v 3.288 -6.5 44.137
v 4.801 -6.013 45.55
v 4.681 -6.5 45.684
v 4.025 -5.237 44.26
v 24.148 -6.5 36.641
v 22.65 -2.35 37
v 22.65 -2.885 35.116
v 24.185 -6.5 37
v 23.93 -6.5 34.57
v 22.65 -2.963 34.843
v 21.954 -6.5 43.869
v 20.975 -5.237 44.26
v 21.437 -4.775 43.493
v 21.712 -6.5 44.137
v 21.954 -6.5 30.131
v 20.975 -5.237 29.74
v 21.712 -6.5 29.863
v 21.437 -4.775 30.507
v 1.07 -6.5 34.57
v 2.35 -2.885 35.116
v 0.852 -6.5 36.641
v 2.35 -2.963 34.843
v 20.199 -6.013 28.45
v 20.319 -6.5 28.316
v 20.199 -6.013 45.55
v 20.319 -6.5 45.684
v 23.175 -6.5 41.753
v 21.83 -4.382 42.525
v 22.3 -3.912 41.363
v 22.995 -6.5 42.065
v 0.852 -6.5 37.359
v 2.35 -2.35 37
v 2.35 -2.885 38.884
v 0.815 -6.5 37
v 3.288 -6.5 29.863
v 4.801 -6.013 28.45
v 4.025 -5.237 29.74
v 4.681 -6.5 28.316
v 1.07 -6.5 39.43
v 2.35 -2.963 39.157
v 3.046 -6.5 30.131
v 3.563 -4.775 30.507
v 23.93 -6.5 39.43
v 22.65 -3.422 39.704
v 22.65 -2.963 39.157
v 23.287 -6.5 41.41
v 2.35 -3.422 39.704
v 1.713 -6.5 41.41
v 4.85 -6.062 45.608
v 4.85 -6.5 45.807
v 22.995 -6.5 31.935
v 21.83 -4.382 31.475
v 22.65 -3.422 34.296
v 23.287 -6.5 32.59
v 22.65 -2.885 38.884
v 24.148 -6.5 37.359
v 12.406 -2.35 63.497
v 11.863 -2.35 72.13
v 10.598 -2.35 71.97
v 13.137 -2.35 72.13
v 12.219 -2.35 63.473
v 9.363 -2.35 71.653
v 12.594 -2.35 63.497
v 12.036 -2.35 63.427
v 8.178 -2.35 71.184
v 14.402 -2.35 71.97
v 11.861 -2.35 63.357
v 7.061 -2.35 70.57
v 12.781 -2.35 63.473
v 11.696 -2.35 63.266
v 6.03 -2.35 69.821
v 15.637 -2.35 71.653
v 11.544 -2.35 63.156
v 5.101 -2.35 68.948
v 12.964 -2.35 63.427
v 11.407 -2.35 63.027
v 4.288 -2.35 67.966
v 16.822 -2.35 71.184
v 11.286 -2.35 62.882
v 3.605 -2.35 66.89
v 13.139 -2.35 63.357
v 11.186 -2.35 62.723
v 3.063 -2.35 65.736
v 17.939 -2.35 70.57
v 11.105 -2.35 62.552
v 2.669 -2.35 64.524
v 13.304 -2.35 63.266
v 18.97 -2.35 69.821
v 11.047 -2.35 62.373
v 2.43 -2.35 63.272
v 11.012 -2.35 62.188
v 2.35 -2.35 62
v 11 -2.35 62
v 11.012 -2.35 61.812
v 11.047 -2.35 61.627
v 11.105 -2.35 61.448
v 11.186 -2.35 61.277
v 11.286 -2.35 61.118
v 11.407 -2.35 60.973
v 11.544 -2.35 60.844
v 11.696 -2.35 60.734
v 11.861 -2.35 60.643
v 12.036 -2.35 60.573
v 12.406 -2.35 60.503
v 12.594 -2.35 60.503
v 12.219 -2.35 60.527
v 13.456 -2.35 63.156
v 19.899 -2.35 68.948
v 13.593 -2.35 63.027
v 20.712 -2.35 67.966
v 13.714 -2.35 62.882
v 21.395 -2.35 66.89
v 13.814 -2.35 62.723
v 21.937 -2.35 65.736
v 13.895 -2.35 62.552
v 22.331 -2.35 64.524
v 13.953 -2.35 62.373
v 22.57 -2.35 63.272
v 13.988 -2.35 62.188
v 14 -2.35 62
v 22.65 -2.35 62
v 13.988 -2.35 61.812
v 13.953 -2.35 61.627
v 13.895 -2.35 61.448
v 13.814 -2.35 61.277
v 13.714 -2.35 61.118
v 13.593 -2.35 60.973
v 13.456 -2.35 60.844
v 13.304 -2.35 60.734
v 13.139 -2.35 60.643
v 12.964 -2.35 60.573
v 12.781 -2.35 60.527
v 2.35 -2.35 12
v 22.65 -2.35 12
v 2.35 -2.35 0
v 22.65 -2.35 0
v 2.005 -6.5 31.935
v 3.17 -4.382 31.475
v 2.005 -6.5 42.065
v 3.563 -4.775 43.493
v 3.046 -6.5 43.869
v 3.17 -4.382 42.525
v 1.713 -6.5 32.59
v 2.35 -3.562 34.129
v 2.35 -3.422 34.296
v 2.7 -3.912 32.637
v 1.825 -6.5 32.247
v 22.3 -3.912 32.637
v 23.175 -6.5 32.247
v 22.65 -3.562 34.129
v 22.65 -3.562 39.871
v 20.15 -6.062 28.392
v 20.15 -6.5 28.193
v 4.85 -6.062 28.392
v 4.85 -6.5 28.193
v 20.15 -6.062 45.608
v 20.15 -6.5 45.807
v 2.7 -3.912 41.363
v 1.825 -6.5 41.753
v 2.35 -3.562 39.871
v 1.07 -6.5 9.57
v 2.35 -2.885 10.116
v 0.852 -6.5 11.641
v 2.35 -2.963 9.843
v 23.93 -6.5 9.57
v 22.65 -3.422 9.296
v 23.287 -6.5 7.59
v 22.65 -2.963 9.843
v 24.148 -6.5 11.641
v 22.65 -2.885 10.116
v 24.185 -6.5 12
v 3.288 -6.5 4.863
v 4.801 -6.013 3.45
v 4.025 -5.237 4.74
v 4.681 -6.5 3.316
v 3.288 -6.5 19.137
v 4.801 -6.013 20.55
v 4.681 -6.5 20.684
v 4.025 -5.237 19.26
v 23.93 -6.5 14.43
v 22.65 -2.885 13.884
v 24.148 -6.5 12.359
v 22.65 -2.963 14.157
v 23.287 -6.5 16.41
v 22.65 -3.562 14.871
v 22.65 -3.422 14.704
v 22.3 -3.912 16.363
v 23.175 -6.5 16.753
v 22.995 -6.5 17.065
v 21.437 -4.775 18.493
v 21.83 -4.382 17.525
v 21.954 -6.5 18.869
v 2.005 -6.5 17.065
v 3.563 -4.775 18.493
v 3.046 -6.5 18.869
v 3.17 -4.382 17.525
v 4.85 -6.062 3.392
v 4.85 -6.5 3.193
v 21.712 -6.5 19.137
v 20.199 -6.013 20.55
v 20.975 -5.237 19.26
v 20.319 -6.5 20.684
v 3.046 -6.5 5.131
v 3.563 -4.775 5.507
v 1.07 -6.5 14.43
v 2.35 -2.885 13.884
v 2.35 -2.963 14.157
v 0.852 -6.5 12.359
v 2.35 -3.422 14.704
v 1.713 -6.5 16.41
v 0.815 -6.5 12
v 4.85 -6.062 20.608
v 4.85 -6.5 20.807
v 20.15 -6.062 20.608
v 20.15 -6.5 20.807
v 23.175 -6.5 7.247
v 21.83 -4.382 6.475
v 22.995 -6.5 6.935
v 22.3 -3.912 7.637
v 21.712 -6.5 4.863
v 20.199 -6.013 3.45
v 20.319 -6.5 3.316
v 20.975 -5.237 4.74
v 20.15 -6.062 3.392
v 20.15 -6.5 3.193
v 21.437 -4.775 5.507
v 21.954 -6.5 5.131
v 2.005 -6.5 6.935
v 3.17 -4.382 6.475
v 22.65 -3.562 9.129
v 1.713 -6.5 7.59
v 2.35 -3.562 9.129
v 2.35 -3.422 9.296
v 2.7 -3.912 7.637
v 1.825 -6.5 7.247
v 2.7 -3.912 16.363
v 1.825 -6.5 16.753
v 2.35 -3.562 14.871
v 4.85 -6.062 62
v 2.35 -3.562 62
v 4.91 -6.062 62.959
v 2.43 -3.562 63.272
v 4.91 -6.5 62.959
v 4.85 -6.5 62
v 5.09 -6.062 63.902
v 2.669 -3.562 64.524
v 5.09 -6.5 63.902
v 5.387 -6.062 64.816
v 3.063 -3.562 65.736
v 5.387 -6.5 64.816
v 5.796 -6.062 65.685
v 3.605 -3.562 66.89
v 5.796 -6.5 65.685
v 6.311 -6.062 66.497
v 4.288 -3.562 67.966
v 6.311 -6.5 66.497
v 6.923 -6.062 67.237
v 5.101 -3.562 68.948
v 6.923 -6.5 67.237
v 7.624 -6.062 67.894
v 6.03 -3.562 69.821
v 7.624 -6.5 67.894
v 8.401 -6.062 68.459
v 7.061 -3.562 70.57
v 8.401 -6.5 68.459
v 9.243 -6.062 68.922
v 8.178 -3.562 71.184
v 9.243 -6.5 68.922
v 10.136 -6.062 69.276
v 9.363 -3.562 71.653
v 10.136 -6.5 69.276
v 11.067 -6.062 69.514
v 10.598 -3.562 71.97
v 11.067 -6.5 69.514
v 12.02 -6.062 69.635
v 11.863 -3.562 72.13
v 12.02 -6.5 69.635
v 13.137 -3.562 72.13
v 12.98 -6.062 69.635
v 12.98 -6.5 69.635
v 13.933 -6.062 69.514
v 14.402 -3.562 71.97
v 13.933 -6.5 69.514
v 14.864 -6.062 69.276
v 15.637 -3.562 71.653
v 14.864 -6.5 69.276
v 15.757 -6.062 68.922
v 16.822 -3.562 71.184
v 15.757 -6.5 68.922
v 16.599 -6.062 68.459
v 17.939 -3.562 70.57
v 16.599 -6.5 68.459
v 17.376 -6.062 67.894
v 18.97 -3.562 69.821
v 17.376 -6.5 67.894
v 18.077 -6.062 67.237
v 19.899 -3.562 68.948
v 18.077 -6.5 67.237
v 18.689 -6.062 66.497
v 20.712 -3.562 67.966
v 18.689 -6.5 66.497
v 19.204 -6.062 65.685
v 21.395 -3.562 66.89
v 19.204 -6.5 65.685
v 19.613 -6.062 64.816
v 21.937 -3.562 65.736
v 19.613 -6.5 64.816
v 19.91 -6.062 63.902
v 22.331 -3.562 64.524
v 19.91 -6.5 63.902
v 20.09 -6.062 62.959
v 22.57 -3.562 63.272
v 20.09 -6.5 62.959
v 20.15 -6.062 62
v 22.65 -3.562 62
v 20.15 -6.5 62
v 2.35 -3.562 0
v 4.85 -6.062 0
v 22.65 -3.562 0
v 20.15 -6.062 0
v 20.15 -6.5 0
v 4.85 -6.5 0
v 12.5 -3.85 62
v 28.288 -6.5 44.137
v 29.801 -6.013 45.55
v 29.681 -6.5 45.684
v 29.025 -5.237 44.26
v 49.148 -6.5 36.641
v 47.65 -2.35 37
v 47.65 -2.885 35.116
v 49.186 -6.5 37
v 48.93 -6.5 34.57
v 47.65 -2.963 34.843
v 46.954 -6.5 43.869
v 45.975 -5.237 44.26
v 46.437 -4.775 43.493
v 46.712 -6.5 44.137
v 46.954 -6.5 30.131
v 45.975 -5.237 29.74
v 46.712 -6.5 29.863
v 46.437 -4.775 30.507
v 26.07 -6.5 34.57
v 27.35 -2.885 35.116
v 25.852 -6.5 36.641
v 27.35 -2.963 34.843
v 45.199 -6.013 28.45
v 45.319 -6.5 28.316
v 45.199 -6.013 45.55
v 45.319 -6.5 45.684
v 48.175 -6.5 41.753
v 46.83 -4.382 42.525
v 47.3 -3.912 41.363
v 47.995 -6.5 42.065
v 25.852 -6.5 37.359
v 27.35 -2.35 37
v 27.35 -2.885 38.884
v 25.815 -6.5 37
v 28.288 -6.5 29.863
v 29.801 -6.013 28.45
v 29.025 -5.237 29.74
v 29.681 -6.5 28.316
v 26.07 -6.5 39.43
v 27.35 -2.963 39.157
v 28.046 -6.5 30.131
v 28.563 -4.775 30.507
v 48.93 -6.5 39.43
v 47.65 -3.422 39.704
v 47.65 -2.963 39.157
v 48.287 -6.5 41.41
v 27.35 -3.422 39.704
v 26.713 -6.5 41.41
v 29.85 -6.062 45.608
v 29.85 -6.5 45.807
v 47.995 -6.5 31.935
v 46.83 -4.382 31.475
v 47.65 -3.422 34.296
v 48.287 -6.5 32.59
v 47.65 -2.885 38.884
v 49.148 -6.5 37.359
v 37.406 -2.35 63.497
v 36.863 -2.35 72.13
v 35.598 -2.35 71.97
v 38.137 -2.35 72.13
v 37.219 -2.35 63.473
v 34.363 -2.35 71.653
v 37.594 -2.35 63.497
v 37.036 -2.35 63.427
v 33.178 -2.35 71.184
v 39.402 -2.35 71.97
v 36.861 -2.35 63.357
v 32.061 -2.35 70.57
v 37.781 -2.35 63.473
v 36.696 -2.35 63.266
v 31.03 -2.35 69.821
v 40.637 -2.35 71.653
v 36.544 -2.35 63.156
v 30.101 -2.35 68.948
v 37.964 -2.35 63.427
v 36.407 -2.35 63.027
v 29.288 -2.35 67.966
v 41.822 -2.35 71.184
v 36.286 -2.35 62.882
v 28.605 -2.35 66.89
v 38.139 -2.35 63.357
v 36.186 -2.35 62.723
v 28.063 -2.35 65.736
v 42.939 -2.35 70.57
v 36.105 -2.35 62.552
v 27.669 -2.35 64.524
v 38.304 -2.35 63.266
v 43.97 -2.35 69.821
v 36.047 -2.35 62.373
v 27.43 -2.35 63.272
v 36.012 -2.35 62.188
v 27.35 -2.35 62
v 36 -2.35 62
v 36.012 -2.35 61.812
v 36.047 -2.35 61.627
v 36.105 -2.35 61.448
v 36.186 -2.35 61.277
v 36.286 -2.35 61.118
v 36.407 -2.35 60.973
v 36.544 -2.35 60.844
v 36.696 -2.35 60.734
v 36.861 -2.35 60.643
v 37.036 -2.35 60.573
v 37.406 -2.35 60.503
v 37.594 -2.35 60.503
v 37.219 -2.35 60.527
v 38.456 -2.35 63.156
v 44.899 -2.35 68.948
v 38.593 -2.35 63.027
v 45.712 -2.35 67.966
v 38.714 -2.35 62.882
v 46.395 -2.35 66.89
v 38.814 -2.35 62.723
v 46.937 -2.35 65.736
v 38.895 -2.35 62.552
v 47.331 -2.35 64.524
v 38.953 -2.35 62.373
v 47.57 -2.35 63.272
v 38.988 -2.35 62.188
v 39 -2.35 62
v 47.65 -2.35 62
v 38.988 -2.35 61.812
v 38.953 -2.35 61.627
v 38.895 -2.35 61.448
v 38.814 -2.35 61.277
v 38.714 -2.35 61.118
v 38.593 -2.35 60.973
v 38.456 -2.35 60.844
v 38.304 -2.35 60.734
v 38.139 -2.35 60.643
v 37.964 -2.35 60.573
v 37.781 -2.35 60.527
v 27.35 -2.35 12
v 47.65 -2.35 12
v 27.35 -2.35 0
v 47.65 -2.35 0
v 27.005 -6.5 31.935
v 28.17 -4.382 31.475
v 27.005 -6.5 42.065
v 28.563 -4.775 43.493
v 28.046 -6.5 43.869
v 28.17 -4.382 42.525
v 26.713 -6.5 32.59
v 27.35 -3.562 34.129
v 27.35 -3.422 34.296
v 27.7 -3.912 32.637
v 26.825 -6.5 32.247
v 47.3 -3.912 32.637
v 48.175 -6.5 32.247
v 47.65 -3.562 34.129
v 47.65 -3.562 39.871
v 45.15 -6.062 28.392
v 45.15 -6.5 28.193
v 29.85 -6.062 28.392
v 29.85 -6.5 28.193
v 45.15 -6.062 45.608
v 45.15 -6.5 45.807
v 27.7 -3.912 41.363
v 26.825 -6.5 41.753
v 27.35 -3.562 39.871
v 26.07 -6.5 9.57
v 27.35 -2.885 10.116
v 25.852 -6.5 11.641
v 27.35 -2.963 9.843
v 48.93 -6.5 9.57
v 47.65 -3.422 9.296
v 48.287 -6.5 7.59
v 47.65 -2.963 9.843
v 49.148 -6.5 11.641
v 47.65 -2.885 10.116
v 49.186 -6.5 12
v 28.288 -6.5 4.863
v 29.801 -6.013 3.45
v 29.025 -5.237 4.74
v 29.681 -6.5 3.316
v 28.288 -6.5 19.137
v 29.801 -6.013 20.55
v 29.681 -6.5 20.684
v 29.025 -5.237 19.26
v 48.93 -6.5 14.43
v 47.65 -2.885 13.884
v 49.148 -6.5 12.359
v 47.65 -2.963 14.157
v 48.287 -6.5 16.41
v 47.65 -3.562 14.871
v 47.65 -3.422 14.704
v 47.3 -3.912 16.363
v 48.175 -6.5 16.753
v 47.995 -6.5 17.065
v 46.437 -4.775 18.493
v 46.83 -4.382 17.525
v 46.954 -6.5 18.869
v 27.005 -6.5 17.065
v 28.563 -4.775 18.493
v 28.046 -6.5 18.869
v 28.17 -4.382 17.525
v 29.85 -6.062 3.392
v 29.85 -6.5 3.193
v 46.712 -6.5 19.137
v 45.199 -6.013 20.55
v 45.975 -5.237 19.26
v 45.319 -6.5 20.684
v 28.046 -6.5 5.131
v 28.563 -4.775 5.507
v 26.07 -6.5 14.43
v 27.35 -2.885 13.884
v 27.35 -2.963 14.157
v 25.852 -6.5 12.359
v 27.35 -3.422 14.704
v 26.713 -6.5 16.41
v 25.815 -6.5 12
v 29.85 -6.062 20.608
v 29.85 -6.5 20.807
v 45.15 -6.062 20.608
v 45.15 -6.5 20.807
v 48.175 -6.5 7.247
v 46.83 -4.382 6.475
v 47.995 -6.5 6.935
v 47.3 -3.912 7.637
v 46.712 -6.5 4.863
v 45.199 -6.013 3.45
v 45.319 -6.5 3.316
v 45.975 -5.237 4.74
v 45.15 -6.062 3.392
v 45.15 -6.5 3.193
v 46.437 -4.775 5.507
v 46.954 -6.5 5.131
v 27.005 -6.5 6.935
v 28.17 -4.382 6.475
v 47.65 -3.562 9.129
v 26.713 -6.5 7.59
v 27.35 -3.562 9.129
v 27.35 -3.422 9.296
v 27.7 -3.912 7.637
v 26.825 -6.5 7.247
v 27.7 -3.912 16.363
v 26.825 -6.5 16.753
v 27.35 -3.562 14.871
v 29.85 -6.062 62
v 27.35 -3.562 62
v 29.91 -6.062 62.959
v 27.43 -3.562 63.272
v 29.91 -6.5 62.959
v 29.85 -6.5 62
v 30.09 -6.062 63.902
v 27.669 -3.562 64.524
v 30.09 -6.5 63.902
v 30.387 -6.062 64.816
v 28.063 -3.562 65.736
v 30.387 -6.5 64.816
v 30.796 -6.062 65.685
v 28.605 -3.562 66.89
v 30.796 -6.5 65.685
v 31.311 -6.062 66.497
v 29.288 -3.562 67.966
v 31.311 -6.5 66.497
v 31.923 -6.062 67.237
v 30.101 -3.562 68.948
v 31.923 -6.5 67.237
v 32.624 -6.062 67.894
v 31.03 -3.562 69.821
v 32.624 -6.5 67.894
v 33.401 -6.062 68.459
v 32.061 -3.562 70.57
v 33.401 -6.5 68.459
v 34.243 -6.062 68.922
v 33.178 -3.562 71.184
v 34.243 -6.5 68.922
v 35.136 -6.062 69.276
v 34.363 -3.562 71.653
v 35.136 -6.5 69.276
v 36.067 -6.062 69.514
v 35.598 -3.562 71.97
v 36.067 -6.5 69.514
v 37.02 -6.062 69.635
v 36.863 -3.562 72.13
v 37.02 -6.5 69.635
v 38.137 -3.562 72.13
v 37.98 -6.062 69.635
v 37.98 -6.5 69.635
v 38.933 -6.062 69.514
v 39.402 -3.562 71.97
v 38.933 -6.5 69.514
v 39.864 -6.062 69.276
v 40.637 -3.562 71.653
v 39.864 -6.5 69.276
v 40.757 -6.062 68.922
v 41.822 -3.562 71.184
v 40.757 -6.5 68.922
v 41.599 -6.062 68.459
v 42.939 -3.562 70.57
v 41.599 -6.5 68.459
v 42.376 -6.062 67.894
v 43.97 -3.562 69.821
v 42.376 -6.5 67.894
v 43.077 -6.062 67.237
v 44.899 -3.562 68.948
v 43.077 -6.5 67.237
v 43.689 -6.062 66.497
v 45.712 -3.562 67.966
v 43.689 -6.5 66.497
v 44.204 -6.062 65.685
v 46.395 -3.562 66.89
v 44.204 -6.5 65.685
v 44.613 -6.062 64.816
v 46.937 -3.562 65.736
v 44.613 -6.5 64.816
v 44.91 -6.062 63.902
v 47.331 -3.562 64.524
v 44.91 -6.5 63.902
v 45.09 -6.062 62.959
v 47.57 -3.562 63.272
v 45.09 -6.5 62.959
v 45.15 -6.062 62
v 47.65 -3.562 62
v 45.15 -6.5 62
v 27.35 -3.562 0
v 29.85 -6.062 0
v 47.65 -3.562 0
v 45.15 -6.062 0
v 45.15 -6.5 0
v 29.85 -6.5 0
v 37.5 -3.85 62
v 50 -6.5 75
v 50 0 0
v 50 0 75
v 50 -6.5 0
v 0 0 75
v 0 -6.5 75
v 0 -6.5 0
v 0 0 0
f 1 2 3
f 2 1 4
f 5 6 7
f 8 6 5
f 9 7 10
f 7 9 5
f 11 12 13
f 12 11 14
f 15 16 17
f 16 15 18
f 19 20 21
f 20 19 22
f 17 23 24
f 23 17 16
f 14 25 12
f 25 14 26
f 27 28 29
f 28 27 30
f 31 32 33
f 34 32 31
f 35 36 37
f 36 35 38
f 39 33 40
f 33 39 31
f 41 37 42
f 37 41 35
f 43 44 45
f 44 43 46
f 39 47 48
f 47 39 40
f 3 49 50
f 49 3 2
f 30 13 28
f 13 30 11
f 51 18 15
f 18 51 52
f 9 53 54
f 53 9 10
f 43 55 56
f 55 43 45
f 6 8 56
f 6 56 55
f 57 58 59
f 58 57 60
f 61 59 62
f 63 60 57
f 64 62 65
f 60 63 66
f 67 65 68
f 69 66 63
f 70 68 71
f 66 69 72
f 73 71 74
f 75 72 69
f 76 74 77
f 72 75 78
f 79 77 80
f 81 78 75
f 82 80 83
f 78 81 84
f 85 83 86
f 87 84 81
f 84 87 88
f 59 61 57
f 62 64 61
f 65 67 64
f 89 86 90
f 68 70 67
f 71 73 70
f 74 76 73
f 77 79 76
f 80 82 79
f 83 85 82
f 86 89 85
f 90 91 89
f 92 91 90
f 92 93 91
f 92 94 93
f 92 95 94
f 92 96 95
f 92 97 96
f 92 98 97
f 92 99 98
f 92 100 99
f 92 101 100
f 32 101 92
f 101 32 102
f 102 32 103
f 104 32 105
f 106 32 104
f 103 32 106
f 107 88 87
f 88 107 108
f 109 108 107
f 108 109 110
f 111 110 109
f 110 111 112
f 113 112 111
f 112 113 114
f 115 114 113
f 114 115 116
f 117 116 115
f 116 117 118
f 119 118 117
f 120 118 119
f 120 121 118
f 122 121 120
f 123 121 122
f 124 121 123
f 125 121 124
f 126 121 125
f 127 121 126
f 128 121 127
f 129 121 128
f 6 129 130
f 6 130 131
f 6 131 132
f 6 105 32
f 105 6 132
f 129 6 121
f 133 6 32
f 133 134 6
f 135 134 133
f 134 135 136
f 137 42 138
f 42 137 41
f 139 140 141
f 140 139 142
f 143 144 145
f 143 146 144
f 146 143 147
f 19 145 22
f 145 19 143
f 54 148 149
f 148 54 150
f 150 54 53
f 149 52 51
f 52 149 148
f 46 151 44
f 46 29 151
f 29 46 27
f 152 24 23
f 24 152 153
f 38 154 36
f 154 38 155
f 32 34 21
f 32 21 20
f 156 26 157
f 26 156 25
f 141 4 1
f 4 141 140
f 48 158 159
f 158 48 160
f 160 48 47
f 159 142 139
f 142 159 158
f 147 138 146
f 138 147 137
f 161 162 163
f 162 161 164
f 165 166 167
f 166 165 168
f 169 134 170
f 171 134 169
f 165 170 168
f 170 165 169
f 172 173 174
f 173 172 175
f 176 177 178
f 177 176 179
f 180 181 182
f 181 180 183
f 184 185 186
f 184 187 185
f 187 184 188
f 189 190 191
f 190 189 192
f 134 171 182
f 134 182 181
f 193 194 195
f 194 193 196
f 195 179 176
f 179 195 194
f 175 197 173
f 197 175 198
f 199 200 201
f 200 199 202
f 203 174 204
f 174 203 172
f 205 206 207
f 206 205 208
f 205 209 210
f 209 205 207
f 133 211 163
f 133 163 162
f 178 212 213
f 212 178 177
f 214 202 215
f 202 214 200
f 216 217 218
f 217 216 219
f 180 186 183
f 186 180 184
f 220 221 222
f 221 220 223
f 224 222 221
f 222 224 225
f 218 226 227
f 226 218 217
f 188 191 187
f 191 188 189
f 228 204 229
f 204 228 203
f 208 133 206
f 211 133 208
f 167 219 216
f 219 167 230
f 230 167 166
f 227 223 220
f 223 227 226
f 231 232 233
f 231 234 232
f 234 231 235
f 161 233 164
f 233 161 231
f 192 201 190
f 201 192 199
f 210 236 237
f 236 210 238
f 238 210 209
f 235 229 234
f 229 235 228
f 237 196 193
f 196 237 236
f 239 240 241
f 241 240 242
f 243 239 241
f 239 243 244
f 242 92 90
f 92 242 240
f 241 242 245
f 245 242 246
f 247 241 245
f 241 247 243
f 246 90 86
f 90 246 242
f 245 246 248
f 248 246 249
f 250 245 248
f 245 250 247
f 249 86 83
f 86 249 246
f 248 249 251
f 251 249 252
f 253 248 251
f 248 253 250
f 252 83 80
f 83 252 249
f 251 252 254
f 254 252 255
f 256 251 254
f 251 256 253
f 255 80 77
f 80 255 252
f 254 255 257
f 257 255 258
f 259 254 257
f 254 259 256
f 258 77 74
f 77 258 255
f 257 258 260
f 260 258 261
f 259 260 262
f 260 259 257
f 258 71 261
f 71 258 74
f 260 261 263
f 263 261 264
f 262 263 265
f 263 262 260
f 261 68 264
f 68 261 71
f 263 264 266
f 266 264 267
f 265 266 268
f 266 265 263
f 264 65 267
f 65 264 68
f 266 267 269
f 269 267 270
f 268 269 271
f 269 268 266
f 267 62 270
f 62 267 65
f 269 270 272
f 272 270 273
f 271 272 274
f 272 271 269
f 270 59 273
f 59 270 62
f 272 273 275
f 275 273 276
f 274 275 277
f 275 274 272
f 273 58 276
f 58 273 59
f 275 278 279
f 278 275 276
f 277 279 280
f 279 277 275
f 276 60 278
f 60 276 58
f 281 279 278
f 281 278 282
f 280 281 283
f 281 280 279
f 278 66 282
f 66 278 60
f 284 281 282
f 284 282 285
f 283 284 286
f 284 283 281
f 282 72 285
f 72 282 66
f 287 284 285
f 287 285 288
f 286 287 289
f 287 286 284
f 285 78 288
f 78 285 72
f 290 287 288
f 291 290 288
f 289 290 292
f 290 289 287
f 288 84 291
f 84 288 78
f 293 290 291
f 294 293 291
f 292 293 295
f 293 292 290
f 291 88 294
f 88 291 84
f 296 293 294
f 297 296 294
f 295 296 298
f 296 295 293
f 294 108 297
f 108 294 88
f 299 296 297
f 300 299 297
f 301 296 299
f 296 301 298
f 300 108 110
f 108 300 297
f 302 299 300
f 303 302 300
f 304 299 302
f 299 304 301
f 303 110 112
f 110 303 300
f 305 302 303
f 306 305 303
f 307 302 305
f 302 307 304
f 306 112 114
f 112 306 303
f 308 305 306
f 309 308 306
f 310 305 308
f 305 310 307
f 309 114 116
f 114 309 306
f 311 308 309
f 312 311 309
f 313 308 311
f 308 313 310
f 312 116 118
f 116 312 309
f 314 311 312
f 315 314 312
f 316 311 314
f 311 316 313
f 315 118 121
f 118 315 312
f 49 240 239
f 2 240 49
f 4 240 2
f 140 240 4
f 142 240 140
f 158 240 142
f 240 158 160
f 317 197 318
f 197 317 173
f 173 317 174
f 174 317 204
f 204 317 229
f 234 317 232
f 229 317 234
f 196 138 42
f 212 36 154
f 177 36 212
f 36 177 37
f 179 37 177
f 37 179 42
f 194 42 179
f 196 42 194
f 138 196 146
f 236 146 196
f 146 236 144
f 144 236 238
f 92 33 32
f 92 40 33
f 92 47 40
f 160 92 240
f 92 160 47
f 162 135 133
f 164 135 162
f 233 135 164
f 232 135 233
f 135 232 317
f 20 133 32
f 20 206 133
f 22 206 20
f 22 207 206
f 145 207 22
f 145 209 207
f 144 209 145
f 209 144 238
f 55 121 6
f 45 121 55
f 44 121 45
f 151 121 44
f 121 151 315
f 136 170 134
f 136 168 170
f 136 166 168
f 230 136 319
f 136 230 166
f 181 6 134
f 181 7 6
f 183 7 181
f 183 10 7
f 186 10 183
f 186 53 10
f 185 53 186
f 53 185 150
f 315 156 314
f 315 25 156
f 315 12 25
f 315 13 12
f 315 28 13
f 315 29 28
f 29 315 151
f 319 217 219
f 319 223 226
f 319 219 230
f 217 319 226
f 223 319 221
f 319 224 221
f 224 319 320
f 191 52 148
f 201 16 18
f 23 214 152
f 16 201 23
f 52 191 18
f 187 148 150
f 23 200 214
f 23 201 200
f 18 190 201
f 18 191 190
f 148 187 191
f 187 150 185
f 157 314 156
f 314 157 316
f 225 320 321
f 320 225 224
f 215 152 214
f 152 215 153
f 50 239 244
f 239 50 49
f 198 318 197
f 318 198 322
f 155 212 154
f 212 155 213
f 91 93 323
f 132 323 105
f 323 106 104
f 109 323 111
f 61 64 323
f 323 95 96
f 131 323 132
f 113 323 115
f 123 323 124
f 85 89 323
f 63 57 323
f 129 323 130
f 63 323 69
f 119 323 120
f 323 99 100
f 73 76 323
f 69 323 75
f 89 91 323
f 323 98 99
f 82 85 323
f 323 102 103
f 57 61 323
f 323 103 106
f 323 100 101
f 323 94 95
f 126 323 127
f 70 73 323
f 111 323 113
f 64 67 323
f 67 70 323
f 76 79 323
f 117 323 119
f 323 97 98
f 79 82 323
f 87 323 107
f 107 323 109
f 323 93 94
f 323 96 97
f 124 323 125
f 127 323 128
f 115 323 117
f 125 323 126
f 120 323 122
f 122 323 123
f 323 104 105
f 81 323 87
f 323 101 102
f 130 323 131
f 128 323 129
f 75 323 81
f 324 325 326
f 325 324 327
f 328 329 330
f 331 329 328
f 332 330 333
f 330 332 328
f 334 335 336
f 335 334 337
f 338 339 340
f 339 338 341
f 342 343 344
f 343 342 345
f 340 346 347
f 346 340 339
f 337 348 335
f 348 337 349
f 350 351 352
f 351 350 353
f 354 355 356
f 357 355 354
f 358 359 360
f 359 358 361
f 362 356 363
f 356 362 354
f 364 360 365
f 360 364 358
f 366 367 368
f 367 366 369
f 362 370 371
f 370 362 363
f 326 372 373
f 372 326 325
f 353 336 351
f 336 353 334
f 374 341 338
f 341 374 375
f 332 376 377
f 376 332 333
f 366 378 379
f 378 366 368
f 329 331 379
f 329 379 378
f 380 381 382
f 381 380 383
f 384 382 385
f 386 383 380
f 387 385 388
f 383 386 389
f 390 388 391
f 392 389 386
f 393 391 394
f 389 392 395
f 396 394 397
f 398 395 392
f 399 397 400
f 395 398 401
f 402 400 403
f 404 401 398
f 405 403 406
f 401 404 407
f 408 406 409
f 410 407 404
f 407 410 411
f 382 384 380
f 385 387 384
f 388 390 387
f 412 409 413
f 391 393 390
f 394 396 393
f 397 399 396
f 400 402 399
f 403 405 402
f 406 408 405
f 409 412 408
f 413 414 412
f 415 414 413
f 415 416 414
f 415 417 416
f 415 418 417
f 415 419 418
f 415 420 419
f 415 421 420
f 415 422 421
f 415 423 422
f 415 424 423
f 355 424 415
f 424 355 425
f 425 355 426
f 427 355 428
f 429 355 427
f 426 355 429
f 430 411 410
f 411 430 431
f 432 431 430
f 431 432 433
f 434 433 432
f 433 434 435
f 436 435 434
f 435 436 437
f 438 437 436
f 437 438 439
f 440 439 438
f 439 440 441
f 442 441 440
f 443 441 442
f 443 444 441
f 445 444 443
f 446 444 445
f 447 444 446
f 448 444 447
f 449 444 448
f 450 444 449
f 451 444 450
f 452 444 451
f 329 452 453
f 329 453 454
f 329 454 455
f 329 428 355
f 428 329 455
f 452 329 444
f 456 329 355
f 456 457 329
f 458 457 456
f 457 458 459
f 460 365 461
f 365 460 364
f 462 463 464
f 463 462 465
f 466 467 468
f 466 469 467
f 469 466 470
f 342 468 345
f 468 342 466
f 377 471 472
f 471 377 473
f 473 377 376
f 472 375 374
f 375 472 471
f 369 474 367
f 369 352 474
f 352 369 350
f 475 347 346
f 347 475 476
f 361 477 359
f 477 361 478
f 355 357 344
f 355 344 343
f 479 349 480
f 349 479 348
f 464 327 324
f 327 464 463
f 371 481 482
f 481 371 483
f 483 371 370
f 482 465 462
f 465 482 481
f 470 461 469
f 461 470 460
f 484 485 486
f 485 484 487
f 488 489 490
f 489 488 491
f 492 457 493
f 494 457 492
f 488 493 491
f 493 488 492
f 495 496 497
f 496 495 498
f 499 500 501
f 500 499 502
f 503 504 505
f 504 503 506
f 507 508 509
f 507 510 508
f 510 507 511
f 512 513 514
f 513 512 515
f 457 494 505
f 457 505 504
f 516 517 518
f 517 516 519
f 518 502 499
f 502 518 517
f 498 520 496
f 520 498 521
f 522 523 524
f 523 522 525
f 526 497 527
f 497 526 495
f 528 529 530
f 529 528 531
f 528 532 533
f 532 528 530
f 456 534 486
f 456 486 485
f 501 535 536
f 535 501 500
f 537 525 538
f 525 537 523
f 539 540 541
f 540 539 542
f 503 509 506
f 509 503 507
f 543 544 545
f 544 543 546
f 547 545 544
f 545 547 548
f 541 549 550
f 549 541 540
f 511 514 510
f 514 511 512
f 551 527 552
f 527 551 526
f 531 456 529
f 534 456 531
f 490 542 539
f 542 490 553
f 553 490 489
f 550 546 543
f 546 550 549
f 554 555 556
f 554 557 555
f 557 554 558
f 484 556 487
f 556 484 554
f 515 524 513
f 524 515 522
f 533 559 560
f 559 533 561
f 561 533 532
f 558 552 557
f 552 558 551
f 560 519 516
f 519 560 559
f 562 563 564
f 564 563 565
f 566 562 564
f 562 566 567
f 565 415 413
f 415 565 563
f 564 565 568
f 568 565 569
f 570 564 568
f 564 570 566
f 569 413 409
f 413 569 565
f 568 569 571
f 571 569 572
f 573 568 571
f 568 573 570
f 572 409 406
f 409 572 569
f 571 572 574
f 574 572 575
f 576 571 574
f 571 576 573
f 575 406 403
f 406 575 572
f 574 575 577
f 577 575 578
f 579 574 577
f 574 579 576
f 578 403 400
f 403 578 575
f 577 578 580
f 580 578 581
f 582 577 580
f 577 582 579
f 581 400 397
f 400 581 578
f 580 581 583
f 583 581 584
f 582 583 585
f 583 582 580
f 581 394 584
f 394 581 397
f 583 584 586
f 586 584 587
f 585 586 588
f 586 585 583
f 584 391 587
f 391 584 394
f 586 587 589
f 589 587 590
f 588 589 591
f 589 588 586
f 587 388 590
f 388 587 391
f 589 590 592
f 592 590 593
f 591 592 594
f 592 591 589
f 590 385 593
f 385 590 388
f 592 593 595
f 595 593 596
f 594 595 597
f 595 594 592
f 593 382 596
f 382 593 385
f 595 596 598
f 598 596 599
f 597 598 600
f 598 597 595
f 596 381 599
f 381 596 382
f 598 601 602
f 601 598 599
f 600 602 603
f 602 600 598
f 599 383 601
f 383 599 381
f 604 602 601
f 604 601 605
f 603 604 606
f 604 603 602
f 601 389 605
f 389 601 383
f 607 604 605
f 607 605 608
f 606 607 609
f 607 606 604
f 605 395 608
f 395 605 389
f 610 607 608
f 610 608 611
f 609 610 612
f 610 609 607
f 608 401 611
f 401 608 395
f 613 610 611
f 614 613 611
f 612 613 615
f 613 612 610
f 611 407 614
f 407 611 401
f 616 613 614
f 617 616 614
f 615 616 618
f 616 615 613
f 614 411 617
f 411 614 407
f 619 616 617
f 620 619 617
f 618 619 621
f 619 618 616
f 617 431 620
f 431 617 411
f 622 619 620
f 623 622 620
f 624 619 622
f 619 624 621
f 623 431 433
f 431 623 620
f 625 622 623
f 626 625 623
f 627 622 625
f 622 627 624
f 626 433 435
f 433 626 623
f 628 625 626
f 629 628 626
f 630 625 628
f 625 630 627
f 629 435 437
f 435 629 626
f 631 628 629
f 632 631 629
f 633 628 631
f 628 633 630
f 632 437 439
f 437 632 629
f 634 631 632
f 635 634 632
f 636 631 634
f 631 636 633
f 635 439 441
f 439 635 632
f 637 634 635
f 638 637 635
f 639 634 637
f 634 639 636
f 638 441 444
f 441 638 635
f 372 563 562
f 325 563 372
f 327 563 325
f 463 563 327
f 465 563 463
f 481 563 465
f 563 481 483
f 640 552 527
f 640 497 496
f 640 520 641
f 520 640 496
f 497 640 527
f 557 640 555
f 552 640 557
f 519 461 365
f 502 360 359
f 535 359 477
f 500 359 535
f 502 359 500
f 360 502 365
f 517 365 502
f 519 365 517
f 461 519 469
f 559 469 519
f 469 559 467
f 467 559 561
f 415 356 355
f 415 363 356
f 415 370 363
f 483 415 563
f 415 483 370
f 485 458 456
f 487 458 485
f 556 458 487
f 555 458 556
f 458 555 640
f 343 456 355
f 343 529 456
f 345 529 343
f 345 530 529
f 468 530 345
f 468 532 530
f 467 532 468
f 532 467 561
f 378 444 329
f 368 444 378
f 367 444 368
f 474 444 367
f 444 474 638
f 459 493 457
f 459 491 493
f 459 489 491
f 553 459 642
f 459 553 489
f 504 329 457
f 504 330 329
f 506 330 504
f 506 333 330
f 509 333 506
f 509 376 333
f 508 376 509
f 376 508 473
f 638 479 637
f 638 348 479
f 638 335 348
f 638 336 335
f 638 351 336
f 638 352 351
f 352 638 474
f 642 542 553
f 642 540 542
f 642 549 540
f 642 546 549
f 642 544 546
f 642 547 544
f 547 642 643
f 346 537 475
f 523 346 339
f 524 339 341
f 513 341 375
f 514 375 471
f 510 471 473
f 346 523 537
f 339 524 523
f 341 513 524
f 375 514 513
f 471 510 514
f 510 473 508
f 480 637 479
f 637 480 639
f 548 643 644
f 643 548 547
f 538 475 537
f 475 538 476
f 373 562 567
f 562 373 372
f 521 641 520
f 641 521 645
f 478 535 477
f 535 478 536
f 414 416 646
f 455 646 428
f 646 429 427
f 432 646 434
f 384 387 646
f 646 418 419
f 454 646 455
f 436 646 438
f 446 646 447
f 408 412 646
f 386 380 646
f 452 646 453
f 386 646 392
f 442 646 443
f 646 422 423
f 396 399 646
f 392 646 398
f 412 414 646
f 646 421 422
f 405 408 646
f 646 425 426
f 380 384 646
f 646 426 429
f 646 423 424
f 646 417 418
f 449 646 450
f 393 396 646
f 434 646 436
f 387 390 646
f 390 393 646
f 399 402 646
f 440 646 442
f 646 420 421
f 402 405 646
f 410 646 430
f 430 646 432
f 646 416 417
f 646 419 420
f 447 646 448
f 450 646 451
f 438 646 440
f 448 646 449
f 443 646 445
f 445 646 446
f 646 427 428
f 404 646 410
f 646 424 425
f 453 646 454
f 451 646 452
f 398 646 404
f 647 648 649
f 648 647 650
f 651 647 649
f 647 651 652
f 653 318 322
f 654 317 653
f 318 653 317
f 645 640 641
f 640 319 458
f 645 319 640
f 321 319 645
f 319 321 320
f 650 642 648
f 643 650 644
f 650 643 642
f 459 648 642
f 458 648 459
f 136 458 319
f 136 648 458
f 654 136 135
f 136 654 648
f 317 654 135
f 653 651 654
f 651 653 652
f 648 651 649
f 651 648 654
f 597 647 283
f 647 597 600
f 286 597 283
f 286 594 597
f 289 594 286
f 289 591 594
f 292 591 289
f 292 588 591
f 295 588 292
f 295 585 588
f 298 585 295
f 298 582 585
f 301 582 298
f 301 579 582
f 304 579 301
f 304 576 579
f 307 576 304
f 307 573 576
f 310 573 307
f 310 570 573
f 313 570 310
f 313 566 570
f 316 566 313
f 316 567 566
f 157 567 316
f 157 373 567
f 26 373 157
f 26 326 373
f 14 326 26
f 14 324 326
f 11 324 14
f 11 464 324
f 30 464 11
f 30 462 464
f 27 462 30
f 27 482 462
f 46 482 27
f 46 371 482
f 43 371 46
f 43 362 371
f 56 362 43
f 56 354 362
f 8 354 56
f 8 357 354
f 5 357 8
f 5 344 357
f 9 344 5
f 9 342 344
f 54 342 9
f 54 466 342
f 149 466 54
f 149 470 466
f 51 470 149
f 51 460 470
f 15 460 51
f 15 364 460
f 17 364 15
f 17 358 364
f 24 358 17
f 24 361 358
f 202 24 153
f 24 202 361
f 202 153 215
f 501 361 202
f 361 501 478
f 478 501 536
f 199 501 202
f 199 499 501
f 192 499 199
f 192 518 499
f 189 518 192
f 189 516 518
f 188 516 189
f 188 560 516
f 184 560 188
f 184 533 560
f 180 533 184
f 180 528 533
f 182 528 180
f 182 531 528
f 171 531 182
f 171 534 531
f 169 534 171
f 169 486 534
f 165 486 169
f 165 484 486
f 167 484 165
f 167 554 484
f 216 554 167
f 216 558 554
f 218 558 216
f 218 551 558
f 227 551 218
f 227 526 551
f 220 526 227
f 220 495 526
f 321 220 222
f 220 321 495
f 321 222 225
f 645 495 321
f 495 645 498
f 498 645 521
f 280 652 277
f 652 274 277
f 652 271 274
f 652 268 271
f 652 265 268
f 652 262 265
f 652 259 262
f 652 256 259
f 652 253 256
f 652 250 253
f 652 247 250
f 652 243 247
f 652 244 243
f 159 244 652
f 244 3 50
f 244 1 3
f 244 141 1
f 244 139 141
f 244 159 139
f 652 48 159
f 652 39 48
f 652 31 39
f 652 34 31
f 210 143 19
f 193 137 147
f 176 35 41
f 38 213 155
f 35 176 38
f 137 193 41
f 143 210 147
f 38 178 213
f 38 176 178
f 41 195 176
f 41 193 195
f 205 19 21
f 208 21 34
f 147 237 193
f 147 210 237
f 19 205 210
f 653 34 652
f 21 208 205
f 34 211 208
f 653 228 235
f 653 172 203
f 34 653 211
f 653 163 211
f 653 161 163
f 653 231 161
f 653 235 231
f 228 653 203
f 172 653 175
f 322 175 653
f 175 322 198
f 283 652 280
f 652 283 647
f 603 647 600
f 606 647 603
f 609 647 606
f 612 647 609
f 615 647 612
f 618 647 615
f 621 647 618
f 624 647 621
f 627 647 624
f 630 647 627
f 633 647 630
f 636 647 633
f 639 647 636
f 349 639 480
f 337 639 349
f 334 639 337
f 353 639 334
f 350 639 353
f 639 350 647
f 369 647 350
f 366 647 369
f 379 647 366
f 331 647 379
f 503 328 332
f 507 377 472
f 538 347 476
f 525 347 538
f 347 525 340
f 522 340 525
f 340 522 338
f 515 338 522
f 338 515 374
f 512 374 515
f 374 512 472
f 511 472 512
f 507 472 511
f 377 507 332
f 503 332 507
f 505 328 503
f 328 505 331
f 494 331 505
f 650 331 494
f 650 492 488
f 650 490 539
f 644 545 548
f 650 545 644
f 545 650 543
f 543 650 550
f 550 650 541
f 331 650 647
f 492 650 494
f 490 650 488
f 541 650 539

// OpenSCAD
/*This file is the master copy of the multiconnect slot back. 
All components of this file are required in any file using this backer
*/

totalWidth = 50;
totalHeight = 75;

/*[Slot Customization]*/
//Distance between Multiconnect slots on the back (25mm is standard for MultiBoard)
distanceBetweenSlots = 25;
//QuickRelease removes the small indent in the top of the slots that lock the part into place
slotQuickRelease = false;
//Dimple scale tweaks the size of the dimple in the slot for printers that need a larger dimple to print correctly
dimpleScale = 1; //[0.5:.05:1.5]
//Scale the size of slots in the back (1.015 scale is default for a tight fit. Increase if your finding poor fit. )
slotTolerance = 1.00; //[0.925:0.005:1.075]
//Move the slot in (positive) or out (negative)
slotDepthMicroadjustment = 0; //[-.5:0.05:.5]
//enable a slot on-ramp for easy mounting of tall items
onRampEnabled = true;
//frequency of slots for on-ramp. 1 = every slot; 2 = every 2 slots; etc.
onRampEveryXSlots = 1;

/* [Hidden] */

multiconnectBack(backWidth = totalWidth, backHeight = totalHeight, distanceBetweenSlots = distanceBetweenSlots);

//BEGIN MODULES
//Slotted back
module multiconnectBack(backWidth, backHeight, distanceBetweenSlots)
{
    //slot count calculates how many slots can fit on the back. Based on internal width for buffer. 
    //slot width needs to be at least the distance between slot for at least 1 slot to generate
    let (backWidth = max(backWidth,distanceBetweenSlots), slotCount = floor(backWidth/distanceBetweenSlots), backThickness = 6.5){
        difference() {
            translate(v = [0,-backThickness,0]) cube(size = [backWidth,backThickness,backHeight]);
            //Loop through slots and center on the item
            //Note: I kept doing math until it looked right. It's possible this can be simplified.
            for (slotNum = [0:1:slotCount-1]) {
                translate(v = [distanceBetweenSlots/2+(backWidth/distanceBetweenSlots-slotCount)*distanceBetweenSlots/2+slotNum*distanceBetweenSlots,-2.35+slotDepthMicroadjustment,backHeight-13]) {
                    color(c = "red")  slotTool(backHeight);
                }
            }
        }
    }
    //Create Slot Tool
    module slotTool(totalHeight) {
        scale(v = slotTolerance)
        //slot minus optional dimple with optional on-ramp
        let (slotProfile = [[0,0],[10.15,0],[10.15,1.2121],[7.65,3.712],[7.65,5],[0,5]])
        difference() {
            union() {
                //round top
                rotate(a = [90,0,0,]) 
                    rotate_extrude($fn=50) 
                        polygon(points = slotProfile);
                //long slot
                translate(v = [0,0,0]) 
                    rotate(a = [180,0,0]) 
                    linear_extrude(height = totalHeight+1) 
                        union(){
                            polygon(points = slotProfile);
                            mirror([1,0,0])
                                polygon(points = slotProfile);
                        }
                //on-ramp
                if(onRampEnabled)
                    for(y = [1:onRampEveryXSlots:totalHeight/distanceBetweenSlots])
                        translate(v = [0,-5,-y*distanceBetweenSlots]) 
                            rotate(a = [-90,0,0]) 
                                color(c = "orange") cylinder(h = 5, r1 = 12, r2 = 10.15);
            }
            //dimple
            if (slotQuickRelease == false)
                scale(v = dimpleScale) 
                rotate(a = [90,0,0,]) 
                    rotate_extrude($fn=50) 
                        polygon(points = [[0,0],[0,1.5],[1.5,0]]);
        }
    }
}
